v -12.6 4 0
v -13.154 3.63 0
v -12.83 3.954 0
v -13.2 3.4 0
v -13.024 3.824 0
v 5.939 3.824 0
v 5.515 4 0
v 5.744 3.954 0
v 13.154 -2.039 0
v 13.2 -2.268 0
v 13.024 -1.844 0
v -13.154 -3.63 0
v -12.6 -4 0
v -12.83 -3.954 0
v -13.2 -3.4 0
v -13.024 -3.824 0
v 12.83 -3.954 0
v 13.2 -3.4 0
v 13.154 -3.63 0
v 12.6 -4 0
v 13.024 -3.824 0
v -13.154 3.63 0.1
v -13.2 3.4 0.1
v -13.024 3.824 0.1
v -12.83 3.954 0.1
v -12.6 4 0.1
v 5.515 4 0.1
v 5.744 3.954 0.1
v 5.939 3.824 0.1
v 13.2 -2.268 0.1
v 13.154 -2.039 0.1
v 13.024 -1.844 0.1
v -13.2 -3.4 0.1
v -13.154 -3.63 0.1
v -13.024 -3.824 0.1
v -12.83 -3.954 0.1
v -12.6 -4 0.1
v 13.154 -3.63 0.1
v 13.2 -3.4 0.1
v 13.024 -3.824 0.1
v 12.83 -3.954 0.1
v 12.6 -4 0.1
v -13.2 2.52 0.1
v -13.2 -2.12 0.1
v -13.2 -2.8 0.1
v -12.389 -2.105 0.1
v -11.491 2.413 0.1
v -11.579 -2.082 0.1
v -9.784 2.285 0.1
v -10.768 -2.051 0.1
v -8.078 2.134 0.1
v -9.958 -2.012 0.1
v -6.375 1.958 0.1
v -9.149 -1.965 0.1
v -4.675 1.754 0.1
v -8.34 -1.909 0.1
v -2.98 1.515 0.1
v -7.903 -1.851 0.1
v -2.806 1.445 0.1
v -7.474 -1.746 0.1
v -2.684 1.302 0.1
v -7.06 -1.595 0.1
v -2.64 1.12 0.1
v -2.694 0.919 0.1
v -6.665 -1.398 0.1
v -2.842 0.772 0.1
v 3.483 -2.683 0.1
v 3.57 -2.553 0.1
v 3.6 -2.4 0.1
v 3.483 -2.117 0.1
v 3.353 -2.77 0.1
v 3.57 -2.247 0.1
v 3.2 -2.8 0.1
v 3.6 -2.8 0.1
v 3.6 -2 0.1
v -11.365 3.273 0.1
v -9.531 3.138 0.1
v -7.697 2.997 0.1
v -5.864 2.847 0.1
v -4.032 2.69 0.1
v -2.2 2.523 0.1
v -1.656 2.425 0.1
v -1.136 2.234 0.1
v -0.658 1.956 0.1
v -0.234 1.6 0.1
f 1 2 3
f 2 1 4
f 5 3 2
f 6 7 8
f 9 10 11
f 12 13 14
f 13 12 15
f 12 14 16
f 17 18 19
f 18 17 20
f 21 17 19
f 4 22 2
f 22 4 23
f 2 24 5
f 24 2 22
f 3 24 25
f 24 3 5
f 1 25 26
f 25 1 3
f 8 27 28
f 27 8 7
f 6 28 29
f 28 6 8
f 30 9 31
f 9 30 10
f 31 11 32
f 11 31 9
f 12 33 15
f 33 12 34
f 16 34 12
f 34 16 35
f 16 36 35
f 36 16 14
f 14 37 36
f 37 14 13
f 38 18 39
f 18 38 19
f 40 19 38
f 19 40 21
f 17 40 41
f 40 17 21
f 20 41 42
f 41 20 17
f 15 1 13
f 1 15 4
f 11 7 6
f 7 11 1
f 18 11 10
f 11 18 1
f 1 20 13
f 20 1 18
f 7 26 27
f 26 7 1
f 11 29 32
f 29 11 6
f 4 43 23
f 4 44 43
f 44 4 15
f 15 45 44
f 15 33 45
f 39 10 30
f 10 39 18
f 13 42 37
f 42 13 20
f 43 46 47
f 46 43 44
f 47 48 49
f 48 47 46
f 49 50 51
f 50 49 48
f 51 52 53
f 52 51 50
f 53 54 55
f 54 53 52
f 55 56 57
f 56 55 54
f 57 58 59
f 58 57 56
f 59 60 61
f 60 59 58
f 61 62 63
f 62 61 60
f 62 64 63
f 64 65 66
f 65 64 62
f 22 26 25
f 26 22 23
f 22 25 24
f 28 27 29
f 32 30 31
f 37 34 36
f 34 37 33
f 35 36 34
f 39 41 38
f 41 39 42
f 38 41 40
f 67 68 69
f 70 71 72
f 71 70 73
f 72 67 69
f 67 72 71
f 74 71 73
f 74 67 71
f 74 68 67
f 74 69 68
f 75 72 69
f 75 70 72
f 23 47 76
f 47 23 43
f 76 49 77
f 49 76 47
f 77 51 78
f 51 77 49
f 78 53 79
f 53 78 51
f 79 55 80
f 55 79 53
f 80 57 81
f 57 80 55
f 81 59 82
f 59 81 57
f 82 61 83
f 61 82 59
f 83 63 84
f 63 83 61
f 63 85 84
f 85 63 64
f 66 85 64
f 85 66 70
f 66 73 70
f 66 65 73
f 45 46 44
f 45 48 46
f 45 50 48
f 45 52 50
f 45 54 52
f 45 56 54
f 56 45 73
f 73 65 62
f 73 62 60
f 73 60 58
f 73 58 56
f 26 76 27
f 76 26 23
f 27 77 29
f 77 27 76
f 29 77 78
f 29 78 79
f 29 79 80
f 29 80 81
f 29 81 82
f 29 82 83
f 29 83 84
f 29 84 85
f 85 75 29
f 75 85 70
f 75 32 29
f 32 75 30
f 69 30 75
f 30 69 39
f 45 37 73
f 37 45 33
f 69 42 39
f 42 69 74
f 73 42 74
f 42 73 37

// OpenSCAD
// file: ../p/1-8cyli.scad
use <../lib.scad>
function ldraw_lib__1_8cyli() = [
// 0 Cylinder 0.125
// 0 Name: 1-8cyli.dat
// 0 Author: James Jessiman
// 0 !LDRAW_ORG Primitive UPDATE 2005-01
// 0 !LICENSE Licensed under CC BY 4.0 : see CAreadme.txt
// 
// 0 BFC CERTIFY CCW
  [0,"BFC","CERTIFY"],
  [0,"BFC","CCW"],
// 
// 0 !HISTORY 2002-04-25 [PTadmin] Official Update 2002-02
// 0 !HISTORY 2004-12-11 [nielsk] Recreated using Primitive Generator, Edge lines fixed, BFC changed to CCW
// 0 !HISTORY 2005-12-28 [PTadmin] Official Update 2005-01
// 0 !HISTORY 2007-06-22 [PTadmin] Header formatted for Contributor Agreement
// 0 !HISTORY 2008-07-01 [PTadmin] Official Update 2008-01
// 
// 
// 4 16 .9239 1 .3827 .9239 0 .3827 1 0 0 1 1 0
  [4,16,.9239,1,.3827,.9239,0,.3827,1,0,0,1,1,0],
// 4 16 .7071 1 .7071 .7071 0 .7071 .9239 0 .3827 .9239 1 .3827
  [4,16,.7071,1,.7071,.7071,0,.7071,.9239,0,.3827,.9239,1,.3827],
// 5 24 1 1 0 1 0 0 1 1 -.4142 .9239 1 .3827
  [5,24,1,1,0,1,0,0,1,1,-.4142,.9239,1,.3827],
// 5 24 .9239 1 .3827 .9239 0 .3827 1 1 0 .7071 1 .7071
  [5,24,.9239,1,.3827,.9239,0,.3827,1,1,0,.7071,1,.7071],
// 5 24 .7071 1 .7071 .7071 0 .7071 .9239 1 .3827 .4142 1 1
  [5,24,.7071,1,.7071,.7071,0,.7071,.9239,1,.3827,.4142,1,1],
// 0
];
module ldraw_lib__1_8cyli(step=0, col=false, unit=2/5, alt=false, line=0.2, solid=!$preview)
    makepoly(ldraw_lib__1_8cyli(), step=step, col=col, unit=unit, alt=alt, line=line, solid=solid);
ldraw_lib__1_8cyli(line=0.2);
// file: ../p/1-4cyli.scad
use <../lib.scad>
function ldraw_lib__1_4cyli() = [
// 0 Cylinder 0.25
// 0 Name: 1-4cyli.dat
// 0 Author: James Jessiman
// 0 !LDRAW_ORG Primitive UPDATE 2012-01
// 0 !LICENSE Licensed under CC BY 4.0 : see CAreadme.txt
// 
// 0 BFC CERTIFY CCW
  [0,"BFC","CERTIFY"],
  [0,"BFC","CCW"],
// 
// 0 !HISTORY 2002-03-23 [sbliss] Added BFC statement.
// 0 !HISTORY 2002-04-25 [PTadmin] Official Update 2002-02
// 0 !HISTORY 2007-06-22 [PTadmin] Header formatted for Contributor Agreement
// 0 !HISTORY 2008-07-01 [PTadmin] Official Update 2008-01
// 0 !HISTORY 2012-02-16 [Philo] Changed to CCW
// 0 !HISTORY 2012-03-30 [PTadmin] Official Update 2012-01
// 
// 
// 4 16 1 1 0 0.9239 1 0.3827 0.9239 0 0.3827 1 0 0
  [4,16,1,1,0,0.9239,1,0.3827,0.9239,0,0.3827,1,0,0],
// 5 24 1 0 0 1 1 0 0.9239 0 0.3827 1 0 -1
  [5,24,1,0,0,1,1,0,0.9239,0,0.3827,1,0,-1],
// 4 16 0.9239 1 0.3827 0.7071 1 0.7071 0.7071 0 0.7071 0.9239 0 0.3827
  [4,16,0.9239,1,0.3827,0.7071,1,0.7071,0.7071,0,0.7071,0.9239,0,0.3827],
// 5 24 0.9239 0 0.3827 0.9239 1 0.3827 0.7071 0 0.7071 1 0 0
  [5,24,0.9239,0,0.3827,0.9239,1,0.3827,0.7071,0,0.7071,1,0,0],
// 4 16 0.7071 1 0.7071 0.3827 1 0.9239 0.3827 0 0.9239 0.7071 0 0.7071
  [4,16,0.7071,1,0.7071,0.3827,1,0.9239,0.3827,0,0.9239,0.7071,0,0.7071],
// 5 24 0.7071 0 0.7071 0.7071 1 0.7071 0.3827 0 0.9239 0.9239 0 0.3827
  [5,24,0.7071,0,0.7071,0.7071,1,0.7071,0.3827,0,0.9239,0.9239,0,0.3827],
// 4 16 0.3827 1 0.9239 0 1 1 0 0 1 0.3827 0 0.9239
  [4,16,0.3827,1,0.9239,0,1,1,0,0,1,0.3827,0,0.9239],
// 5 24 0.3827 0 0.9239 0.3827 1 0.9239 0 0 1 0.7071 0 0.7071
  [5,24,0.3827,0,0.9239,0.3827,1,0.9239,0,0,1,0.7071,0,0.7071],
// 5 24 0 0 1 0 1 1 0.3827 0 0.9239 -1 0 1
  [5,24,0,0,1,0,1,1,0.3827,0,0.9239,-1,0,1],
];
module ldraw_lib__1_4cyli(step=0, col=false, unit=2/5, alt=false, line=0.2, solid=!$preview)
    makepoly(ldraw_lib__1_4cyli(), step=step, col=col, unit=unit, alt=alt, line=line, solid=solid);
ldraw_lib__1_4cyli(line=0.2);
// file: s/stickerback010x033a.scad
use <../../lib.scad>
use <../../p/1-4chrd.scad>
use <../../p/1-4cyli.scad>
use <../../p/1-8chrd.scad>
use <../../p/1-8cyli.scad>
function ldraw_lib__s__stickerback010x033a() = [
// 0 ~Sticker Back  1.0 x  3.3 Irregular
// 0 Name: s\stickerback010x033a.dat
// 0 Author: Massimo Maso [Sirio]
// 0 !LDRAW_ORG Subpart UPDATE 2025-08
// 0 !LICENSE Licensed under CC BY 4.0 : see CAreadme.txt
// 
// 0 BFC CERTIFY CCW
  [0,"BFC","CERTIFY"],
  [0,"BFC","CCW"],
// 
// 0 !HISTORY 2025-08-31 [OrionP] Official Update 2025-08
// 
// 0 // Primitives
// 1 16 -31.5 0 8.5 -1.5 0 0 0 -1 0 0 0 1.5 1-4chrd.dat
  [1,16,-31.5,0,8.5,-1.5,0,0,0,-1,0,0,0,1.5, ldraw_lib__1_4chrd()],
// 1 16 13.787 0 8.5 0 0 1.5 0 -1 0 1.5 0 0 1-8chrd.dat
  [1,16,13.787,0,8.5,0,0,1.5,0,-1,0,1.5,0,0, ldraw_lib__1_8chrd()],
// 1 16 31.5 0 -5.6704 1.5 0 0 0 -1 0 0 0 1.5 1-8chrd.dat
  [1,16,31.5,0,-5.6704,1.5,0,0,0,-1,0,0,0,1.5, ldraw_lib__1_8chrd()],
// 1 16 -31.5 0 -8.5 -1.5 0 0 0 -1 0 0 0 -1.5 1-4chrd.dat
  [1,16,-31.5,0,-8.5,-1.5,0,0,0,-1,0,0,0,-1.5, ldraw_lib__1_4chrd()],
// 1 16 31.5 0 -8.5 1.5 0 0 0 -1 0 0 0 -1.5 1-4chrd.dat
  [1,16,31.5,0,-8.5,1.5,0,0,0,-1,0,0,0,-1.5, ldraw_lib__1_4chrd()],
// 1 16 -31.5 0 8.5 -1.5 0 0 0 -.25 0 0 0 1.5 1-4cyli.dat
  [1,16,-31.5,0,8.5,-1.5,0,0,0,-.25,0,0,0,1.5, ldraw_lib__1_4cyli()],
// 1 16 13.787 0 8.5 0 0 1.5 0 -.25 0 1.5 0 0 1-8cyli.dat
  [1,16,13.787,0,8.5,0,0,1.5,0,-.25,0,1.5,0,0, ldraw_lib__1_8cyli()],
// 1 16 31.5 0 -5.6704 1.5 0 0 0 -.25 0 0 0 1.5 1-8cyli.dat
  [1,16,31.5,0,-5.6704,1.5,0,0,0,-.25,0,0,0,1.5, ldraw_lib__1_8cyli()],
// 1 16 -31.5 0 -8.5 -1.5 0 0 0 -.25 0 0 0 -1.5 1-4cyli.dat
  [1,16,-31.5,0,-8.5,-1.5,0,0,0,-.25,0,0,0,-1.5, ldraw_lib__1_4cyli()],
// 1 16 31.5 0 -8.5 1.5 0 0 0 -.25 0 0 0 -1.5 1-4cyli.dat
  [1,16,31.5,0,-8.5,1.5,0,0,0,-.25,0,0,0,-1.5, ldraw_lib__1_4cyli()],
// 0 // Bottom faces
// 4 16 -31.5 0 10 -31.5 0 -10 -33 0 -8.5 -33 0 8.5
  [4,16,-31.5,0,10,-31.5,0,-10,-33,0,-8.5,-33,0,8.5],
// 4 16 -31.5 0 10 13.787 0 10 14.8477 0 9.5607 32.5607 0 -4.6098
  [4,16,-31.5,0,10,13.787,0,10,14.8477,0,9.5607,32.5607,0,-4.6098],
// 4 16 -31.5 0 10 32.5607 0 -4.6098 33 0 -5.6704 33 0 -8.5
  [4,16,-31.5,0,10,32.5607,0,-4.6098,33,0,-5.6704,33,0,-8.5],
// 4 16 -31.5 0 10 33 0 -8.5 31.5 0 -10 -31.5 0 -10
  [4,16,-31.5,0,10,33,0,-8.5,31.5,0,-10,-31.5,0,-10],
// 0 // Lateral faces
// 4 16 -31.5 0 10 -31.5 -.25 10 13.787 -.25 10 13.787 0 10
  [4,16,-31.5,0,10,-31.5,-.25,10,13.787,-.25,10,13.787,0,10],
// 4 16 14.8477 0 9.5607 14.8477 -.25 9.5607 32.5607 -.25 -4.6098 32.5607 0 -4.6098
  [4,16,14.8477,0,9.5607,14.8477,-.25,9.5607,32.5607,-.25,-4.6098,32.5607,0,-4.6098],
// 3 16 -33 0 8.5 -33 -.25 6.3 -33 -.25 8.5
  [3,16,-33,0,8.5,-33,-.25,6.3,-33,-.25,8.5],
// 4 16 -33 0 8.5 -33 0 -8.5 -33 -.25 -5.3 -33 -.25 6.3
  [4,16,-33,0,8.5,-33,0,-8.5,-33,-.25,-5.3,-33,-.25,6.3],
// 3 16 -33 0 -8.5 -33 -.25 -7 -33 -.25 -5.3
  [3,16,-33,0,-8.5,-33,-.25,-7,-33,-.25,-5.3],
// 3 16 -33 0 -8.5 -33 -.25 -8.5 -33 -.25 -7
  [3,16,-33,0,-8.5,-33,-.25,-8.5,-33,-.25,-7],
// 4 16 33 0 -5.6704 33 -.25 -5.6704 33 -.25 -8.5 33 0 -8.5
  [4,16,33,0,-5.6704,33,-.25,-5.6704,33,-.25,-8.5,33,0,-8.5],
// 4 16 -31.5 0 -10 31.5 0 -10 31.5 -.25 -10 -31.5 -.25 -10
  [4,16,-31.5,0,-10,31.5,0,-10,31.5,-.25,-10,-31.5,-.25,-10],
// 0 // Conditional lines
// 5 24 14.8477 -.25 9.5607 14.8477 0 9.5607 14.3611 -.25 9.8859 32.5607 -.25 -4.6098
  [5,24,14.8477,-.25,9.5607,14.8477,0,9.5607,14.3611,-.25,9.8859,32.5607,-.25,-4.6098],
// 5 24 32.5607 -.25 -4.6098 32.5607 0 -4.6098 32.8859 -.25 -5.0964 14.8477 -.25 9.5607
  [5,24,32.5607,-.25,-4.6098,32.5607,0,-4.6098,32.8859,-.25,-5.0964,14.8477,-.25,9.5607],
];
module ldraw_lib__s__stickerback010x033a(step=0, col=false, unit=2/5, alt=false, line=0.2, solid=!$preview)
    makepoly(ldraw_lib__s__stickerback010x033a(), step=step, col=col, unit=unit, alt=alt, line=line, solid=solid);
ldraw_lib__s__stickerback010x033a(line=0.2);
// file: ../p/3-8ndis.scad
use <../lib.scad>
function ldraw_lib__3_8ndis() = [
// 0 Disc Negative 0.375
// 0 Name: 3-8ndis.dat
// 0 Author: Alex Taylor [anathema]
// 0 !LDRAW_ORG Primitive UPDATE 2009-02
// 0 !LICENSE Licensed under CC BY 4.0 : see CAreadme.txt
// 
// 0 BFC CERTIFY CCW
  [0,"BFC","CERTIFY"],
  [0,"BFC","CCW"],
// 
// 0 !HISTORY 2009-09-03 [PTadmin] Official Update 2009-02
// 
// 
// 3 16 1 0 1 0.9239 0 0.3827 1 0 0
  [3,16,1,0,1,0.9239,0,0.3827,1,0,0],
// 3 16 1 0 1 0.7071 0 0.7071 0.9239 0 0.3827
  [3,16,1,0,1,0.7071,0,0.7071,0.9239,0,0.3827],
// 3 16 1 0 1 0.3827 0 0.9239 0.7071 0 0.7071
  [3,16,1,0,1,0.3827,0,0.9239,0.7071,0,0.7071],
// 3 16 1 0 1 0 0 1 0.3827 0 0.9239
  [3,16,1,0,1,0,0,1,0.3827,0,0.9239],
// 3 16 -1 0 1 -0.3827 0 0.9239 0 0 1
  [3,16,-1,0,1,-0.3827,0,0.9239,0,0,1],
// 3 16 -1 0 1 -0.7071 0 0.7071 -0.3827 0 0.9239
  [3,16,-1,0,1,-0.7071,0,0.7071,-0.3827,0,0.9239],
// 0
];
module ldraw_lib__3_8ndis(step=0, col=false, unit=2/5, alt=false, line=0.2, solid=!$preview)
    makepoly(ldraw_lib__3_8ndis(), step=step, col=col, unit=unit, alt=alt, line=line, solid=solid);
ldraw_lib__3_8ndis(line=0.2);
// file: ../p/3-8chrd.scad
use <../lib.scad>
function ldraw_lib__3_8chrd() = [
// 0 Chord 0.375
// 0 Name: 3-8chrd.dat
// 0 Author: Donald Sutter [technog]
// 0 !LDRAW_ORG Primitive UPDATE 2005-01
// 0 !LICENSE Licensed under CC BY 4.0 : see CAreadme.txt
// 
// 0 BFC CERTIFY CCW
  [0,"BFC","CERTIFY"],
  [0,"BFC","CCW"],
// 
// 0 !HISTORY 2004-01-07 [Steffen] added primitive code for POVray
// 0 !HISTORY 2004-03-18 [mkennedy] removed pov code and rearanged polygons.
// 0 !HISTORY 2004-09-12 [cwdee] reversed winding and standardised precision
// 0 !HISTORY 2005-12-28 [PTadmin] Official Update 2005-01
// 0 !HISTORY 2007-06-24 [PTadmin] Header formatted for Contributor Agreement
// 0 !HISTORY 2008-07-01 [PTadmin] Official Update 2008-01
// 
// 
// 3 16 0.7071 0 0.7071 0.3827 0 0.9239 0 0 1
  [3,16,0.7071,0,0.7071,0.3827,0,0.9239,0,0,1],
// 4 16 0.9239 0 0.3827 -0.3827 0 0.9239 -0.7071 0 0.7071 1 0 0
  [4,16,0.9239,0,0.3827,-0.3827,0,0.9239,-0.7071,0,0.7071,1,0,0],
// 4 16 0.7071 0 0.7071 0 0 1 -0.3827 0 0.9239 0.9239 0 0.3827
  [4,16,0.7071,0,0.7071,0,0,1,-0.3827,0,0.9239,0.9239,0,0.3827],
// 0
];
module ldraw_lib__3_8chrd(step=0, col=false, unit=2/5, alt=false, line=0.2, solid=!$preview)
    makepoly(ldraw_lib__3_8chrd(), step=step, col=col, unit=unit, alt=alt, line=line, solid=solid);
ldraw_lib__3_8chrd(line=0.2);
// file: ../p/1-8chrd.scad
use <../lib.scad>
function ldraw_lib__1_8chrd() = [
// 0 Chord 0.125
// 0 Name: 1-8chrd.dat
// 0 Author: Orion Pobursky [OrionP]
// 0 !LDRAW_ORG Primitive UPDATE 2023-05
// 0 !LICENSE Licensed under CC BY 4.0 : see CAreadme.txt
// 
// 0 BFC CERTIFY CCW
  [0,"BFC","CERTIFY"],
  [0,"BFC","CCW"],
// 
// 0 !HISTORY 2004-04-22 [PTadmin] Official Update 2004-02
// 0 !HISTORY 2007-06-22 [PTadmin] Header formatted for Contributor Agreement
// 0 !HISTORY 2008-07-01 [PTadmin] Official Update 2008-01
// 0 !HISTORY 2023-10-27 [OrionP] Rebuilt with PrimGen2, original author westrate
// 0 !HISTORY 2023-10-31 [OrionP] Official Update 2023-05
// 
// 3 16 1 0 0 0.9239 0 0.3827 0.7071 0 0.7071
  [3,16,1,0,0,0.9239,0,0.3827,0.7071,0,0.7071],
];
module ldraw_lib__1_8chrd(step=0, col=false, unit=2/5, alt=false, line=0.2, solid=!$preview)
    makepoly(ldraw_lib__1_8chrd(), step=step, col=col, unit=unit, alt=alt, line=line, solid=solid);
ldraw_lib__1_8chrd(line=0.2);
// file: ../p/1-4chrd.scad
use <../lib.scad>
function ldraw_lib__1_4chrd() = [
// 0 Chord 0.25
// 0 Name: 1-4chrd.dat
// 0 Author: Max Martin Richter [MMR1988]
// 0 !LDRAW_ORG Primitive UPDATE 2023-05
// 0 !LICENSE Licensed under CC BY 4.0 : see CAreadme.txt
// 
// 0 BFC CERTIFY CCW
  [0,"BFC","CERTIFY"],
  [0,"BFC","CCW"],
// 
// 0 !HISTORY 2004-04-22 [PTadmin] Official Update 2004-02
// 0 !HISTORY 2007-10-09 [PTadmin] Header formatted for Contributor Agreement
// 0 !HISTORY 2008-07-01 [PTadmin] Official Update 2008-01
// 0 !HISTORY 2012-08-02 [MMR1988] Re-creation with PrimGen2 and Rectifier
// 0 !HISTORY 2012-08-09 [PTadmin] Official Update 2012-02
// 0 !HISTORY 2023-10-27 [OrionP] Change author to MMR1988 from hafhead
// 0 !HISTORY 2023-10-31 [OrionP] Official Update 2023-05
// 
// 4 16 0.9239 0 0.3827 0.3827 0 0.9239 0 0 1 1 0 0
  [4,16,0.9239,0,0.3827,0.3827,0,0.9239,0,0,1,1,0,0],
// 3 16 0.7071 0 0.7071 0.3827 0 0.9239 0.9239 0 0.3827
  [3,16,0.7071,0,0.7071,0.3827,0,0.9239,0.9239,0,0.3827],
];
module ldraw_lib__1_4chrd(step=0, col=false, unit=2/5, alt=false, line=0.2, solid=!$preview)
    makepoly(ldraw_lib__1_4chrd(), step=step, col=col, unit=unit, alt=alt, line=line, solid=solid);
ldraw_lib__1_4chrd(line=0.2);
// main file
use <../lib.scad>
use <../p/1-4chrd.scad>
use <../p/1-8chrd.scad>
use <../p/3-8chrd.scad>
use <../p/3-8ndis.scad>
use <s/stickerback010x033a.scad>
function ldraw_lib__6254024q() = [
// 0 Sticker  1.0 x  3.3 with Black Triangle and Grey Trapezoid on Transparent Background Right
// 0 Name: 6254024q.dat
// 0 Author: Massimo Maso [Sirio]
// 0 !LDRAW_ORG Part UPDATE 2025-08
// 0 !LICENSE Licensed under CC BY 4.0 : see CAreadme.txt
// 
// 0 BFC CERTIFY CCW
  [0,"BFC","CERTIFY"],
  [0,"BFC","CCW"],
// 
// 0 !KEYWORDS BrickLink 75892stk01, McLaren, Rebrickable 49144, Senna, Set 75892
// 0 !KEYWORDS Speed Champions
// 
// 0 !HISTORY 2025-08-31 [OrionP] Official Update 2025-08
// 
// 0 // Stickerback
// 1 16 0 0 0 1 0 0 0 1 0 0 0 1 s\stickerback010x033a.dat
  [1,16,0,0,0,1,0,0,0,1,0,0,0,1, ldraw_lib__s__stickerback010x033a()],
// 0 // Top faces
// 0 // Neutral faces
// 4 16 -30.9731 -.25 -5.2619 -28.728 -.25 6.0327 -33 -.25 6.3 -33 -.25 -5.3
  [4,16,-30.9731,-.25,-5.2619,-28.728,-.25,6.0327,-33,-.25,6.3,-33,-.25,-5.3],
// 4 16 -30.9731 -.25 -5.2619 -28.9467 -.25 -5.2046 -24.4597 -.25 5.713 -28.728 -.25 6.0327
  [4,16,-30.9731,-.25,-5.2619,-28.9467,-.25,-5.2046,-24.4597,-.25,5.713,-28.728,-.25,6.0327],
// 4 16 -26.921 -.25 -5.1277 -20.196 -.25 5.3361 -24.4597 -.25 5.713 -28.9467 -.25 -5.2046
  [4,16,-26.921,-.25,-5.1277,-20.196,-.25,5.3361,-24.4597,-.25,5.713,-28.9467,-.25,-5.2046],
// 4 16 -26.921 -.25 -5.1277 -24.8961 -.25 -5.0306 -15.9383 -.25 4.8959 -20.196 -.25 5.3361
  [4,16,-26.921,-.25,-5.1277,-24.8961,-.25,-5.0306,-15.9383,-.25,4.8959,-20.196,-.25,5.3361],
// 4 16 -22.8723 -.25 -4.9123 -11.6887 -.25 4.384 -15.9383 -.25 4.8959 -24.8961 -.25 -5.0306
  [4,16,-22.8723,-.25,-4.9123,-11.6887,-.25,4.384,-15.9383,-.25,4.8959,-24.8961,-.25,-5.0306],
// 4 16 -22.8723 -.25 -4.9123 -20.85 -.25 -4.7718 -7.45 -.25 3.7887 -11.6887 -.25 4.384
  [4,16,-22.8723,-.25,-4.9123,-20.85,-.25,-4.7718,-7.45,-.25,3.7887,-11.6887,-.25,4.384],
// 4 16 -19.7565 -.25 -4.6286 -7.0157 -.25 3.6116 -7.45 -.25 3.7887 -20.85 -.25 -4.7718
  [4,16,-19.7565,-.25,-4.6286,-7.0157,-.25,3.6116,-7.45,-.25,3.7887,-20.85,-.25,-4.7718],
// 4 16 -19.7565 -.25 -4.6286 -18.6854 -.25 -4.3658 -6.71 -.25 3.2559 -7.0157 -.25 3.6116
  [4,16,-19.7565,-.25,-4.6286,-18.6854,-.25,-4.3658,-6.71,-.25,3.2559,-7.0157,-.25,3.6116],
// 4 16 -17.6497 -.25 -3.9867 -6.6 -.25 2.8 -6.71 -.25 3.2559 -18.6854 -.25 -4.3658
  [4,16,-17.6497,-.25,-3.9867,-6.6,-.25,2.8,-6.71,-.25,3.2559,-18.6854,-.25,-4.3658],
// 3 16 -17.6497 -.25 -3.9867 -6.7358 -.25 2.2969 -6.6 -.25 2.8
  [3,16,-17.6497,-.25,-3.9867,-6.7358,-.25,2.2969,-6.6,-.25,2.8],
// 4 16 -17.6497 -.25 -3.9867 -16.6621 -.25 -3.4958 -7.1062 -.25 1.9304 -6.7358 -.25 2.2969
  [4,16,-17.6497,-.25,-3.9867,-16.6621,-.25,-3.4958,-7.1062,-.25,1.9304,-6.7358,-.25,2.2969],
// 0 BFC NOCLIP
  [0,"BFC","NOCLIP"],
// 0 // Primitives
// 1 72 -31.5 -.25 8.5 -1.5 0 0 0 1 0 0 0 1.5 1-4chrd.dat
  [1,72,-31.5,-.25,8.5,-1.5,0,0,0,1,0,0,0,1.5, ldraw_lib__1_4chrd()],
// 1 72 13.787 -.25 8.5 0 0 1.5 0 1 0 1.5 0 0 1-8chrd.dat
  [1,72,13.787,-.25,8.5,0,0,1.5,0,1,0,1.5,0,0, ldraw_lib__1_8chrd()],
// 1 72 31.5 -.25 -5.6704 1.5 0 0 0 1 0 0 0 1.5 1-8chrd.dat
  [1,72,31.5,-.25,-5.6704,1.5,0,0,0,1,0,0,0,1.5, ldraw_lib__1_8chrd()],
// 1 72 -31.5 -.25 -8.5 -1.5 0 0 0 1 0 0 0 -1.5 1-4chrd.dat
  [1,72,-31.5,-.25,-8.5,-1.5,0,0,0,1,0,0,0,-1.5, ldraw_lib__1_4chrd()],
// 1 72 31.5 -.25 -8.5 1.5 0 0 0 1 0 0 0 -1.5 1-4chrd.dat
  [1,72,31.5,-.25,-8.5,1.5,0,0,0,1,0,0,0,-1.5, ldraw_lib__1_4chrd()],
// 1 0 8 -.25 -6 0 0 1 0 1 0 -1 0 0 3-8chrd.dat
  [1,0,8,-.25,-6,0,0,1,0,1,0,-1,0,0, ldraw_lib__3_8chrd()],
// 1 72 8 -.25 -6 0 0 1 0 1 0 -1 0 0 3-8ndis.dat
  [1,72,8,-.25,-6,0,0,1,0,1,0,-1,0,0, ldraw_lib__3_8ndis()],
// 0 // Black faces
// 4 0 -28.728 -.25 6.0327 -28.4131 -.25 8.1817 -33 -.25 8.5 -33 -.25 6.3
  [4,0,-28.728,-.25,6.0327,-28.4131,-.25,8.1817,-33,-.25,8.5,-33,-.25,6.3],
// 4 0 -28.728 -.25 6.0327 -24.4597 -.25 5.713 -23.8273 -.25 7.8459 -28.4131 -.25 8.1817
  [4,0,-28.728,-.25,6.0327,-24.4597,-.25,5.713,-23.8273,-.25,7.8459,-28.4131,-.25,8.1817],
// 4 0 -20.196 -.25 5.3361 -19.243 -.25 7.4917 -23.8273 -.25 7.8459 -24.4597 -.25 5.713
  [4,0,-20.196,-.25,5.3361,-19.243,-.25,7.4917,-23.8273,-.25,7.8459,-24.4597,-.25,5.713],
// 4 0 -20.196 -.25 5.3361 -15.9383 -.25 4.8959 -14.6602 -.25 7.1181 -19.243 -.25 7.4917
  [4,0,-20.196,-.25,5.3361,-15.9383,-.25,4.8959,-14.6602,-.25,7.1181,-19.243,-.25,7.4917],
// 4 0 -11.6887 -.25 4.384 -10.0792 -.25 6.7242 -14.6602 -.25 7.1181 -15.9383 -.25 4.8959
  [4,0,-11.6887,-.25,4.384,-10.0792,-.25,6.7242,-14.6602,-.25,7.1181,-15.9383,-.25,4.8959],
// 4 0 -11.6887 -.25 4.384 -7.45 -.25 3.7887 -5.5 -.25 6.3086 -10.0792 -.25 6.7242
  [4,0,-11.6887,-.25,4.384,-7.45,-.25,3.7887,-5.5,-.25,6.3086,-10.0792,-.25,6.7242],
// 4 0 -7.0157 -.25 3.6116 -4.1391 -.25 6.0616 -5.5 -.25 6.3086 -7.45 -.25 3.7887
  [4,0,-7.0157,-.25,3.6116,-4.1391,-.25,6.0616,-5.5,-.25,6.3086,-7.45,-.25,3.7887],
// 4 0 -7.0157 -.25 3.6116 -6.71 -.25 3.2559 -2.8411 -.25 5.5839 -4.1391 -.25 6.0616
  [4,0,-7.0157,-.25,3.6116,-6.71,-.25,3.2559,-2.8411,-.25,5.5839,-4.1391,-.25,6.0616],
// 4 0 -6.6 -.25 2.8 -1.6447 -.25 4.8898 -2.8411 -.25 5.5839 -6.71 -.25 3.2559
  [4,0,-6.6,-.25,2.8,-1.6447,-.25,4.8898,-2.8411,-.25,5.5839,-6.71,-.25,3.2559],
// 4 0 -6.6 -.25 2.8 -6.7358 -.25 2.2969 -.5858 -.25 4 -1.6447 -.25 4.8898
  [4,0,-6.6,-.25,2.8,-6.7358,-.25,2.2969,-.5858,-.25,4,-1.6447,-.25,4.8898],
// 4 0 -7.1062 -.25 1.9304 8.7071 -.25 -5.2929 -.5858 -.25 4 -6.7358 -.25 2.2969
  [4,0,-7.1062,-.25,1.9304,8.7071,-.25,-5.2929,-.5858,-.25,4,-6.7358,-.25,2.2969],
// 3 0 -7.1062 -.25 1.9304 8 -.25 -7 8.7071 -.25 -5.2929
  [3,0,-7.1062,-.25,1.9304,8,-.25,-7,8.7071,-.25,-5.2929],
// 3 0 -7.1062 -.25 1.9304 -16.6621 -.25 -3.4958 8 -.25 -7
  [3,0,-7.1062,-.25,1.9304,-16.6621,-.25,-3.4958,8,-.25,-7],
// 3 0 -33 -.25 -7 -30.9731 -.25 -5.2619 -33 -.25 -5.3
  [3,0,-33,-.25,-7,-30.9731,-.25,-5.2619,-33,-.25,-5.3],
// 3 0 -33 -.25 -7 -28.9467 -.25 -5.2046 -30.9731 -.25 -5.2619
  [3,0,-33,-.25,-7,-28.9467,-.25,-5.2046,-30.9731,-.25,-5.2619],
// 3 0 -33 -.25 -7 -26.921 -.25 -5.1277 -28.9467 -.25 -5.2046
  [3,0,-33,-.25,-7,-26.921,-.25,-5.1277,-28.9467,-.25,-5.2046],
// 3 0 -33 -.25 -7 -24.8961 -.25 -5.0306 -26.921 -.25 -5.1277
  [3,0,-33,-.25,-7,-24.8961,-.25,-5.0306,-26.921,-.25,-5.1277],
// 3 0 -33 -.25 -7 -22.8723 -.25 -4.9123 -24.8961 -.25 -5.0306
  [3,0,-33,-.25,-7,-22.8723,-.25,-4.9123,-24.8961,-.25,-5.0306],
// 4 0 -33 -.25 -7 8 -.25 -7 -20.85 -.25 -4.7718 -22.8723 -.25 -4.9123
  [4,0,-33,-.25,-7,8,-.25,-7,-20.85,-.25,-4.7718,-22.8723,-.25,-4.9123],
// 3 0 8 -.25 -7 -16.6621 -.25 -3.4958 -17.6497 -.25 -3.9867
  [3,0,8,-.25,-7,-16.6621,-.25,-3.4958,-17.6497,-.25,-3.9867],
// 3 0 8 -.25 -7 -17.6497 -.25 -3.9867 -18.6854 -.25 -4.3658
  [3,0,8,-.25,-7,-17.6497,-.25,-3.9867,-18.6854,-.25,-4.3658],
// 3 0 8 -.25 -7 -18.6854 -.25 -4.3658 -19.7565 -.25 -4.6286
  [3,0,8,-.25,-7,-18.6854,-.25,-4.3658,-19.7565,-.25,-4.6286],
// 3 0 8 -.25 -7 -19.7565 -.25 -4.6286 -20.85 -.25 -4.7718
  [3,0,8,-.25,-7,-19.7565,-.25,-4.6286,-20.85,-.25,-4.7718],
// 0 // Grey faces
// 4 72 13.787 -.25 10 -31.5 -.25 10 -33 -.25 8.5 -28.4131 -.25 8.1817
  [4,72,13.787,-.25,10,-31.5,-.25,10,-33,-.25,8.5,-28.4131,-.25,8.1817],
// 4 72 13.787 -.25 10 -28.4131 -.25 8.1817 -23.8273 -.25 7.8459 14.84765 -.25 9.56065
  [4,72,13.787,-.25,10,-28.4131,-.25,8.1817,-23.8273,-.25,7.8459,14.84765,-.25,9.56065],
// 3 72 14.84765 -.25 9.56065 -23.8273 -.25 7.8459 -19.243 -.25 7.4917
  [3,72,14.84765,-.25,9.56065,-23.8273,-.25,7.8459,-19.243,-.25,7.4917],
// 3 72 14.84765 -.25 9.56065 -19.243 -.25 7.4917 -14.6602 -.25 7.1181
  [3,72,14.84765,-.25,9.56065,-19.243,-.25,7.4917,-14.6602,-.25,7.1181],
// 3 72 14.84765 -.25 9.56065 -14.6602 -.25 7.1181 -10.0792 -.25 6.7242
  [3,72,14.84765,-.25,9.56065,-14.6602,-.25,7.1181,-10.0792,-.25,6.7242],
// 3 72 14.84765 -.25 9.56065 -10.0792 -.25 6.7242 -5.5 -.25 6.308601
  [3,72,14.84765,-.25,9.56065,-10.0792,-.25,6.7242,-5.5,-.25,6.308601],
// 3 72 14.84765 -.25 9.56065 -5.5 -.25 6.308601 -4.1391 -.25 6.0616
  [3,72,14.84765,-.25,9.56065,-5.5,-.25,6.308601,-4.1391,-.25,6.0616],
// 3 72 14.84765 -.25 9.56065 -4.1391 -.25 6.0616 -2.8411 -.25 5.5839
  [3,72,14.84765,-.25,9.56065,-4.1391,-.25,6.0616,-2.8411,-.25,5.5839],
// 3 72 14.84765 -.25 9.56065 -2.8411 -.25 5.5839 -1.6447 -.25 4.8898
  [3,72,14.84765,-.25,9.56065,-2.8411,-.25,5.5839,-1.6447,-.25,4.8898],
// 3 72 14.84765 -.25 9.56065 -1.6447 -.25 4.8898 -.5858 -.25 4
  [3,72,14.84765,-.25,9.56065,-1.6447,-.25,4.8898,-.5858,-.25,4],
// 4 72 14.84765 -.25 9.56065 -.5858 -.25 4 8.7071 -.25 -5.2929 9 -.25 -5
  [4,72,14.84765,-.25,9.56065,-.5858,-.25,4,8.7071,-.25,-5.2929,9,-.25,-5],
// 4 72 33 -.25 -5.6704 32.56065 -.25 -4.60975 14.84765 -.25 9.56065 9 -.25 -5
  [4,72,33,-.25,-5.6704,32.56065,-.25,-4.60975,14.84765,-.25,9.56065,9,-.25,-5],
// 4 72 33 -.25 -5.6704 9 -.25 -5 9 -.25 -6 33 -.25 -8.5
  [4,72,33,-.25,-5.6704,9,-.25,-5,9,-.25,-6,33,-.25,-8.5],
// 4 72 -31.5 -.25 -10 8 -.25 -7 -33 -.25 -7 -33 -.25 -8.5
  [4,72,-31.5,-.25,-10,8,-.25,-7,-33,-.25,-7,-33,-.25,-8.5],
// 4 72 31.5 -.25 -10 33 -.25 -8.5 9 -.25 -6 9 -.25 -7
  [4,72,31.5,-.25,-10,33,-.25,-8.5,9,-.25,-6,9,-.25,-7],
// 4 72 31.5 -.25 -10 9 -.25 -7 8 -.25 -7 -31.5 -.25 -10
  [4,72,31.5,-.25,-10,9,-.25,-7,8,-.25,-7,-31.5,-.25,-10],
];
module ldraw_lib__6254024q(step=0, col=false, unit=2/5, alt=false, line=0.2, solid=!$preview)
    makepoly(ldraw_lib__6254024q(), step=step, col=col, unit=unit, alt=alt, line=line, solid=solid);
ldraw_lib__6254024q(line=0.2);
